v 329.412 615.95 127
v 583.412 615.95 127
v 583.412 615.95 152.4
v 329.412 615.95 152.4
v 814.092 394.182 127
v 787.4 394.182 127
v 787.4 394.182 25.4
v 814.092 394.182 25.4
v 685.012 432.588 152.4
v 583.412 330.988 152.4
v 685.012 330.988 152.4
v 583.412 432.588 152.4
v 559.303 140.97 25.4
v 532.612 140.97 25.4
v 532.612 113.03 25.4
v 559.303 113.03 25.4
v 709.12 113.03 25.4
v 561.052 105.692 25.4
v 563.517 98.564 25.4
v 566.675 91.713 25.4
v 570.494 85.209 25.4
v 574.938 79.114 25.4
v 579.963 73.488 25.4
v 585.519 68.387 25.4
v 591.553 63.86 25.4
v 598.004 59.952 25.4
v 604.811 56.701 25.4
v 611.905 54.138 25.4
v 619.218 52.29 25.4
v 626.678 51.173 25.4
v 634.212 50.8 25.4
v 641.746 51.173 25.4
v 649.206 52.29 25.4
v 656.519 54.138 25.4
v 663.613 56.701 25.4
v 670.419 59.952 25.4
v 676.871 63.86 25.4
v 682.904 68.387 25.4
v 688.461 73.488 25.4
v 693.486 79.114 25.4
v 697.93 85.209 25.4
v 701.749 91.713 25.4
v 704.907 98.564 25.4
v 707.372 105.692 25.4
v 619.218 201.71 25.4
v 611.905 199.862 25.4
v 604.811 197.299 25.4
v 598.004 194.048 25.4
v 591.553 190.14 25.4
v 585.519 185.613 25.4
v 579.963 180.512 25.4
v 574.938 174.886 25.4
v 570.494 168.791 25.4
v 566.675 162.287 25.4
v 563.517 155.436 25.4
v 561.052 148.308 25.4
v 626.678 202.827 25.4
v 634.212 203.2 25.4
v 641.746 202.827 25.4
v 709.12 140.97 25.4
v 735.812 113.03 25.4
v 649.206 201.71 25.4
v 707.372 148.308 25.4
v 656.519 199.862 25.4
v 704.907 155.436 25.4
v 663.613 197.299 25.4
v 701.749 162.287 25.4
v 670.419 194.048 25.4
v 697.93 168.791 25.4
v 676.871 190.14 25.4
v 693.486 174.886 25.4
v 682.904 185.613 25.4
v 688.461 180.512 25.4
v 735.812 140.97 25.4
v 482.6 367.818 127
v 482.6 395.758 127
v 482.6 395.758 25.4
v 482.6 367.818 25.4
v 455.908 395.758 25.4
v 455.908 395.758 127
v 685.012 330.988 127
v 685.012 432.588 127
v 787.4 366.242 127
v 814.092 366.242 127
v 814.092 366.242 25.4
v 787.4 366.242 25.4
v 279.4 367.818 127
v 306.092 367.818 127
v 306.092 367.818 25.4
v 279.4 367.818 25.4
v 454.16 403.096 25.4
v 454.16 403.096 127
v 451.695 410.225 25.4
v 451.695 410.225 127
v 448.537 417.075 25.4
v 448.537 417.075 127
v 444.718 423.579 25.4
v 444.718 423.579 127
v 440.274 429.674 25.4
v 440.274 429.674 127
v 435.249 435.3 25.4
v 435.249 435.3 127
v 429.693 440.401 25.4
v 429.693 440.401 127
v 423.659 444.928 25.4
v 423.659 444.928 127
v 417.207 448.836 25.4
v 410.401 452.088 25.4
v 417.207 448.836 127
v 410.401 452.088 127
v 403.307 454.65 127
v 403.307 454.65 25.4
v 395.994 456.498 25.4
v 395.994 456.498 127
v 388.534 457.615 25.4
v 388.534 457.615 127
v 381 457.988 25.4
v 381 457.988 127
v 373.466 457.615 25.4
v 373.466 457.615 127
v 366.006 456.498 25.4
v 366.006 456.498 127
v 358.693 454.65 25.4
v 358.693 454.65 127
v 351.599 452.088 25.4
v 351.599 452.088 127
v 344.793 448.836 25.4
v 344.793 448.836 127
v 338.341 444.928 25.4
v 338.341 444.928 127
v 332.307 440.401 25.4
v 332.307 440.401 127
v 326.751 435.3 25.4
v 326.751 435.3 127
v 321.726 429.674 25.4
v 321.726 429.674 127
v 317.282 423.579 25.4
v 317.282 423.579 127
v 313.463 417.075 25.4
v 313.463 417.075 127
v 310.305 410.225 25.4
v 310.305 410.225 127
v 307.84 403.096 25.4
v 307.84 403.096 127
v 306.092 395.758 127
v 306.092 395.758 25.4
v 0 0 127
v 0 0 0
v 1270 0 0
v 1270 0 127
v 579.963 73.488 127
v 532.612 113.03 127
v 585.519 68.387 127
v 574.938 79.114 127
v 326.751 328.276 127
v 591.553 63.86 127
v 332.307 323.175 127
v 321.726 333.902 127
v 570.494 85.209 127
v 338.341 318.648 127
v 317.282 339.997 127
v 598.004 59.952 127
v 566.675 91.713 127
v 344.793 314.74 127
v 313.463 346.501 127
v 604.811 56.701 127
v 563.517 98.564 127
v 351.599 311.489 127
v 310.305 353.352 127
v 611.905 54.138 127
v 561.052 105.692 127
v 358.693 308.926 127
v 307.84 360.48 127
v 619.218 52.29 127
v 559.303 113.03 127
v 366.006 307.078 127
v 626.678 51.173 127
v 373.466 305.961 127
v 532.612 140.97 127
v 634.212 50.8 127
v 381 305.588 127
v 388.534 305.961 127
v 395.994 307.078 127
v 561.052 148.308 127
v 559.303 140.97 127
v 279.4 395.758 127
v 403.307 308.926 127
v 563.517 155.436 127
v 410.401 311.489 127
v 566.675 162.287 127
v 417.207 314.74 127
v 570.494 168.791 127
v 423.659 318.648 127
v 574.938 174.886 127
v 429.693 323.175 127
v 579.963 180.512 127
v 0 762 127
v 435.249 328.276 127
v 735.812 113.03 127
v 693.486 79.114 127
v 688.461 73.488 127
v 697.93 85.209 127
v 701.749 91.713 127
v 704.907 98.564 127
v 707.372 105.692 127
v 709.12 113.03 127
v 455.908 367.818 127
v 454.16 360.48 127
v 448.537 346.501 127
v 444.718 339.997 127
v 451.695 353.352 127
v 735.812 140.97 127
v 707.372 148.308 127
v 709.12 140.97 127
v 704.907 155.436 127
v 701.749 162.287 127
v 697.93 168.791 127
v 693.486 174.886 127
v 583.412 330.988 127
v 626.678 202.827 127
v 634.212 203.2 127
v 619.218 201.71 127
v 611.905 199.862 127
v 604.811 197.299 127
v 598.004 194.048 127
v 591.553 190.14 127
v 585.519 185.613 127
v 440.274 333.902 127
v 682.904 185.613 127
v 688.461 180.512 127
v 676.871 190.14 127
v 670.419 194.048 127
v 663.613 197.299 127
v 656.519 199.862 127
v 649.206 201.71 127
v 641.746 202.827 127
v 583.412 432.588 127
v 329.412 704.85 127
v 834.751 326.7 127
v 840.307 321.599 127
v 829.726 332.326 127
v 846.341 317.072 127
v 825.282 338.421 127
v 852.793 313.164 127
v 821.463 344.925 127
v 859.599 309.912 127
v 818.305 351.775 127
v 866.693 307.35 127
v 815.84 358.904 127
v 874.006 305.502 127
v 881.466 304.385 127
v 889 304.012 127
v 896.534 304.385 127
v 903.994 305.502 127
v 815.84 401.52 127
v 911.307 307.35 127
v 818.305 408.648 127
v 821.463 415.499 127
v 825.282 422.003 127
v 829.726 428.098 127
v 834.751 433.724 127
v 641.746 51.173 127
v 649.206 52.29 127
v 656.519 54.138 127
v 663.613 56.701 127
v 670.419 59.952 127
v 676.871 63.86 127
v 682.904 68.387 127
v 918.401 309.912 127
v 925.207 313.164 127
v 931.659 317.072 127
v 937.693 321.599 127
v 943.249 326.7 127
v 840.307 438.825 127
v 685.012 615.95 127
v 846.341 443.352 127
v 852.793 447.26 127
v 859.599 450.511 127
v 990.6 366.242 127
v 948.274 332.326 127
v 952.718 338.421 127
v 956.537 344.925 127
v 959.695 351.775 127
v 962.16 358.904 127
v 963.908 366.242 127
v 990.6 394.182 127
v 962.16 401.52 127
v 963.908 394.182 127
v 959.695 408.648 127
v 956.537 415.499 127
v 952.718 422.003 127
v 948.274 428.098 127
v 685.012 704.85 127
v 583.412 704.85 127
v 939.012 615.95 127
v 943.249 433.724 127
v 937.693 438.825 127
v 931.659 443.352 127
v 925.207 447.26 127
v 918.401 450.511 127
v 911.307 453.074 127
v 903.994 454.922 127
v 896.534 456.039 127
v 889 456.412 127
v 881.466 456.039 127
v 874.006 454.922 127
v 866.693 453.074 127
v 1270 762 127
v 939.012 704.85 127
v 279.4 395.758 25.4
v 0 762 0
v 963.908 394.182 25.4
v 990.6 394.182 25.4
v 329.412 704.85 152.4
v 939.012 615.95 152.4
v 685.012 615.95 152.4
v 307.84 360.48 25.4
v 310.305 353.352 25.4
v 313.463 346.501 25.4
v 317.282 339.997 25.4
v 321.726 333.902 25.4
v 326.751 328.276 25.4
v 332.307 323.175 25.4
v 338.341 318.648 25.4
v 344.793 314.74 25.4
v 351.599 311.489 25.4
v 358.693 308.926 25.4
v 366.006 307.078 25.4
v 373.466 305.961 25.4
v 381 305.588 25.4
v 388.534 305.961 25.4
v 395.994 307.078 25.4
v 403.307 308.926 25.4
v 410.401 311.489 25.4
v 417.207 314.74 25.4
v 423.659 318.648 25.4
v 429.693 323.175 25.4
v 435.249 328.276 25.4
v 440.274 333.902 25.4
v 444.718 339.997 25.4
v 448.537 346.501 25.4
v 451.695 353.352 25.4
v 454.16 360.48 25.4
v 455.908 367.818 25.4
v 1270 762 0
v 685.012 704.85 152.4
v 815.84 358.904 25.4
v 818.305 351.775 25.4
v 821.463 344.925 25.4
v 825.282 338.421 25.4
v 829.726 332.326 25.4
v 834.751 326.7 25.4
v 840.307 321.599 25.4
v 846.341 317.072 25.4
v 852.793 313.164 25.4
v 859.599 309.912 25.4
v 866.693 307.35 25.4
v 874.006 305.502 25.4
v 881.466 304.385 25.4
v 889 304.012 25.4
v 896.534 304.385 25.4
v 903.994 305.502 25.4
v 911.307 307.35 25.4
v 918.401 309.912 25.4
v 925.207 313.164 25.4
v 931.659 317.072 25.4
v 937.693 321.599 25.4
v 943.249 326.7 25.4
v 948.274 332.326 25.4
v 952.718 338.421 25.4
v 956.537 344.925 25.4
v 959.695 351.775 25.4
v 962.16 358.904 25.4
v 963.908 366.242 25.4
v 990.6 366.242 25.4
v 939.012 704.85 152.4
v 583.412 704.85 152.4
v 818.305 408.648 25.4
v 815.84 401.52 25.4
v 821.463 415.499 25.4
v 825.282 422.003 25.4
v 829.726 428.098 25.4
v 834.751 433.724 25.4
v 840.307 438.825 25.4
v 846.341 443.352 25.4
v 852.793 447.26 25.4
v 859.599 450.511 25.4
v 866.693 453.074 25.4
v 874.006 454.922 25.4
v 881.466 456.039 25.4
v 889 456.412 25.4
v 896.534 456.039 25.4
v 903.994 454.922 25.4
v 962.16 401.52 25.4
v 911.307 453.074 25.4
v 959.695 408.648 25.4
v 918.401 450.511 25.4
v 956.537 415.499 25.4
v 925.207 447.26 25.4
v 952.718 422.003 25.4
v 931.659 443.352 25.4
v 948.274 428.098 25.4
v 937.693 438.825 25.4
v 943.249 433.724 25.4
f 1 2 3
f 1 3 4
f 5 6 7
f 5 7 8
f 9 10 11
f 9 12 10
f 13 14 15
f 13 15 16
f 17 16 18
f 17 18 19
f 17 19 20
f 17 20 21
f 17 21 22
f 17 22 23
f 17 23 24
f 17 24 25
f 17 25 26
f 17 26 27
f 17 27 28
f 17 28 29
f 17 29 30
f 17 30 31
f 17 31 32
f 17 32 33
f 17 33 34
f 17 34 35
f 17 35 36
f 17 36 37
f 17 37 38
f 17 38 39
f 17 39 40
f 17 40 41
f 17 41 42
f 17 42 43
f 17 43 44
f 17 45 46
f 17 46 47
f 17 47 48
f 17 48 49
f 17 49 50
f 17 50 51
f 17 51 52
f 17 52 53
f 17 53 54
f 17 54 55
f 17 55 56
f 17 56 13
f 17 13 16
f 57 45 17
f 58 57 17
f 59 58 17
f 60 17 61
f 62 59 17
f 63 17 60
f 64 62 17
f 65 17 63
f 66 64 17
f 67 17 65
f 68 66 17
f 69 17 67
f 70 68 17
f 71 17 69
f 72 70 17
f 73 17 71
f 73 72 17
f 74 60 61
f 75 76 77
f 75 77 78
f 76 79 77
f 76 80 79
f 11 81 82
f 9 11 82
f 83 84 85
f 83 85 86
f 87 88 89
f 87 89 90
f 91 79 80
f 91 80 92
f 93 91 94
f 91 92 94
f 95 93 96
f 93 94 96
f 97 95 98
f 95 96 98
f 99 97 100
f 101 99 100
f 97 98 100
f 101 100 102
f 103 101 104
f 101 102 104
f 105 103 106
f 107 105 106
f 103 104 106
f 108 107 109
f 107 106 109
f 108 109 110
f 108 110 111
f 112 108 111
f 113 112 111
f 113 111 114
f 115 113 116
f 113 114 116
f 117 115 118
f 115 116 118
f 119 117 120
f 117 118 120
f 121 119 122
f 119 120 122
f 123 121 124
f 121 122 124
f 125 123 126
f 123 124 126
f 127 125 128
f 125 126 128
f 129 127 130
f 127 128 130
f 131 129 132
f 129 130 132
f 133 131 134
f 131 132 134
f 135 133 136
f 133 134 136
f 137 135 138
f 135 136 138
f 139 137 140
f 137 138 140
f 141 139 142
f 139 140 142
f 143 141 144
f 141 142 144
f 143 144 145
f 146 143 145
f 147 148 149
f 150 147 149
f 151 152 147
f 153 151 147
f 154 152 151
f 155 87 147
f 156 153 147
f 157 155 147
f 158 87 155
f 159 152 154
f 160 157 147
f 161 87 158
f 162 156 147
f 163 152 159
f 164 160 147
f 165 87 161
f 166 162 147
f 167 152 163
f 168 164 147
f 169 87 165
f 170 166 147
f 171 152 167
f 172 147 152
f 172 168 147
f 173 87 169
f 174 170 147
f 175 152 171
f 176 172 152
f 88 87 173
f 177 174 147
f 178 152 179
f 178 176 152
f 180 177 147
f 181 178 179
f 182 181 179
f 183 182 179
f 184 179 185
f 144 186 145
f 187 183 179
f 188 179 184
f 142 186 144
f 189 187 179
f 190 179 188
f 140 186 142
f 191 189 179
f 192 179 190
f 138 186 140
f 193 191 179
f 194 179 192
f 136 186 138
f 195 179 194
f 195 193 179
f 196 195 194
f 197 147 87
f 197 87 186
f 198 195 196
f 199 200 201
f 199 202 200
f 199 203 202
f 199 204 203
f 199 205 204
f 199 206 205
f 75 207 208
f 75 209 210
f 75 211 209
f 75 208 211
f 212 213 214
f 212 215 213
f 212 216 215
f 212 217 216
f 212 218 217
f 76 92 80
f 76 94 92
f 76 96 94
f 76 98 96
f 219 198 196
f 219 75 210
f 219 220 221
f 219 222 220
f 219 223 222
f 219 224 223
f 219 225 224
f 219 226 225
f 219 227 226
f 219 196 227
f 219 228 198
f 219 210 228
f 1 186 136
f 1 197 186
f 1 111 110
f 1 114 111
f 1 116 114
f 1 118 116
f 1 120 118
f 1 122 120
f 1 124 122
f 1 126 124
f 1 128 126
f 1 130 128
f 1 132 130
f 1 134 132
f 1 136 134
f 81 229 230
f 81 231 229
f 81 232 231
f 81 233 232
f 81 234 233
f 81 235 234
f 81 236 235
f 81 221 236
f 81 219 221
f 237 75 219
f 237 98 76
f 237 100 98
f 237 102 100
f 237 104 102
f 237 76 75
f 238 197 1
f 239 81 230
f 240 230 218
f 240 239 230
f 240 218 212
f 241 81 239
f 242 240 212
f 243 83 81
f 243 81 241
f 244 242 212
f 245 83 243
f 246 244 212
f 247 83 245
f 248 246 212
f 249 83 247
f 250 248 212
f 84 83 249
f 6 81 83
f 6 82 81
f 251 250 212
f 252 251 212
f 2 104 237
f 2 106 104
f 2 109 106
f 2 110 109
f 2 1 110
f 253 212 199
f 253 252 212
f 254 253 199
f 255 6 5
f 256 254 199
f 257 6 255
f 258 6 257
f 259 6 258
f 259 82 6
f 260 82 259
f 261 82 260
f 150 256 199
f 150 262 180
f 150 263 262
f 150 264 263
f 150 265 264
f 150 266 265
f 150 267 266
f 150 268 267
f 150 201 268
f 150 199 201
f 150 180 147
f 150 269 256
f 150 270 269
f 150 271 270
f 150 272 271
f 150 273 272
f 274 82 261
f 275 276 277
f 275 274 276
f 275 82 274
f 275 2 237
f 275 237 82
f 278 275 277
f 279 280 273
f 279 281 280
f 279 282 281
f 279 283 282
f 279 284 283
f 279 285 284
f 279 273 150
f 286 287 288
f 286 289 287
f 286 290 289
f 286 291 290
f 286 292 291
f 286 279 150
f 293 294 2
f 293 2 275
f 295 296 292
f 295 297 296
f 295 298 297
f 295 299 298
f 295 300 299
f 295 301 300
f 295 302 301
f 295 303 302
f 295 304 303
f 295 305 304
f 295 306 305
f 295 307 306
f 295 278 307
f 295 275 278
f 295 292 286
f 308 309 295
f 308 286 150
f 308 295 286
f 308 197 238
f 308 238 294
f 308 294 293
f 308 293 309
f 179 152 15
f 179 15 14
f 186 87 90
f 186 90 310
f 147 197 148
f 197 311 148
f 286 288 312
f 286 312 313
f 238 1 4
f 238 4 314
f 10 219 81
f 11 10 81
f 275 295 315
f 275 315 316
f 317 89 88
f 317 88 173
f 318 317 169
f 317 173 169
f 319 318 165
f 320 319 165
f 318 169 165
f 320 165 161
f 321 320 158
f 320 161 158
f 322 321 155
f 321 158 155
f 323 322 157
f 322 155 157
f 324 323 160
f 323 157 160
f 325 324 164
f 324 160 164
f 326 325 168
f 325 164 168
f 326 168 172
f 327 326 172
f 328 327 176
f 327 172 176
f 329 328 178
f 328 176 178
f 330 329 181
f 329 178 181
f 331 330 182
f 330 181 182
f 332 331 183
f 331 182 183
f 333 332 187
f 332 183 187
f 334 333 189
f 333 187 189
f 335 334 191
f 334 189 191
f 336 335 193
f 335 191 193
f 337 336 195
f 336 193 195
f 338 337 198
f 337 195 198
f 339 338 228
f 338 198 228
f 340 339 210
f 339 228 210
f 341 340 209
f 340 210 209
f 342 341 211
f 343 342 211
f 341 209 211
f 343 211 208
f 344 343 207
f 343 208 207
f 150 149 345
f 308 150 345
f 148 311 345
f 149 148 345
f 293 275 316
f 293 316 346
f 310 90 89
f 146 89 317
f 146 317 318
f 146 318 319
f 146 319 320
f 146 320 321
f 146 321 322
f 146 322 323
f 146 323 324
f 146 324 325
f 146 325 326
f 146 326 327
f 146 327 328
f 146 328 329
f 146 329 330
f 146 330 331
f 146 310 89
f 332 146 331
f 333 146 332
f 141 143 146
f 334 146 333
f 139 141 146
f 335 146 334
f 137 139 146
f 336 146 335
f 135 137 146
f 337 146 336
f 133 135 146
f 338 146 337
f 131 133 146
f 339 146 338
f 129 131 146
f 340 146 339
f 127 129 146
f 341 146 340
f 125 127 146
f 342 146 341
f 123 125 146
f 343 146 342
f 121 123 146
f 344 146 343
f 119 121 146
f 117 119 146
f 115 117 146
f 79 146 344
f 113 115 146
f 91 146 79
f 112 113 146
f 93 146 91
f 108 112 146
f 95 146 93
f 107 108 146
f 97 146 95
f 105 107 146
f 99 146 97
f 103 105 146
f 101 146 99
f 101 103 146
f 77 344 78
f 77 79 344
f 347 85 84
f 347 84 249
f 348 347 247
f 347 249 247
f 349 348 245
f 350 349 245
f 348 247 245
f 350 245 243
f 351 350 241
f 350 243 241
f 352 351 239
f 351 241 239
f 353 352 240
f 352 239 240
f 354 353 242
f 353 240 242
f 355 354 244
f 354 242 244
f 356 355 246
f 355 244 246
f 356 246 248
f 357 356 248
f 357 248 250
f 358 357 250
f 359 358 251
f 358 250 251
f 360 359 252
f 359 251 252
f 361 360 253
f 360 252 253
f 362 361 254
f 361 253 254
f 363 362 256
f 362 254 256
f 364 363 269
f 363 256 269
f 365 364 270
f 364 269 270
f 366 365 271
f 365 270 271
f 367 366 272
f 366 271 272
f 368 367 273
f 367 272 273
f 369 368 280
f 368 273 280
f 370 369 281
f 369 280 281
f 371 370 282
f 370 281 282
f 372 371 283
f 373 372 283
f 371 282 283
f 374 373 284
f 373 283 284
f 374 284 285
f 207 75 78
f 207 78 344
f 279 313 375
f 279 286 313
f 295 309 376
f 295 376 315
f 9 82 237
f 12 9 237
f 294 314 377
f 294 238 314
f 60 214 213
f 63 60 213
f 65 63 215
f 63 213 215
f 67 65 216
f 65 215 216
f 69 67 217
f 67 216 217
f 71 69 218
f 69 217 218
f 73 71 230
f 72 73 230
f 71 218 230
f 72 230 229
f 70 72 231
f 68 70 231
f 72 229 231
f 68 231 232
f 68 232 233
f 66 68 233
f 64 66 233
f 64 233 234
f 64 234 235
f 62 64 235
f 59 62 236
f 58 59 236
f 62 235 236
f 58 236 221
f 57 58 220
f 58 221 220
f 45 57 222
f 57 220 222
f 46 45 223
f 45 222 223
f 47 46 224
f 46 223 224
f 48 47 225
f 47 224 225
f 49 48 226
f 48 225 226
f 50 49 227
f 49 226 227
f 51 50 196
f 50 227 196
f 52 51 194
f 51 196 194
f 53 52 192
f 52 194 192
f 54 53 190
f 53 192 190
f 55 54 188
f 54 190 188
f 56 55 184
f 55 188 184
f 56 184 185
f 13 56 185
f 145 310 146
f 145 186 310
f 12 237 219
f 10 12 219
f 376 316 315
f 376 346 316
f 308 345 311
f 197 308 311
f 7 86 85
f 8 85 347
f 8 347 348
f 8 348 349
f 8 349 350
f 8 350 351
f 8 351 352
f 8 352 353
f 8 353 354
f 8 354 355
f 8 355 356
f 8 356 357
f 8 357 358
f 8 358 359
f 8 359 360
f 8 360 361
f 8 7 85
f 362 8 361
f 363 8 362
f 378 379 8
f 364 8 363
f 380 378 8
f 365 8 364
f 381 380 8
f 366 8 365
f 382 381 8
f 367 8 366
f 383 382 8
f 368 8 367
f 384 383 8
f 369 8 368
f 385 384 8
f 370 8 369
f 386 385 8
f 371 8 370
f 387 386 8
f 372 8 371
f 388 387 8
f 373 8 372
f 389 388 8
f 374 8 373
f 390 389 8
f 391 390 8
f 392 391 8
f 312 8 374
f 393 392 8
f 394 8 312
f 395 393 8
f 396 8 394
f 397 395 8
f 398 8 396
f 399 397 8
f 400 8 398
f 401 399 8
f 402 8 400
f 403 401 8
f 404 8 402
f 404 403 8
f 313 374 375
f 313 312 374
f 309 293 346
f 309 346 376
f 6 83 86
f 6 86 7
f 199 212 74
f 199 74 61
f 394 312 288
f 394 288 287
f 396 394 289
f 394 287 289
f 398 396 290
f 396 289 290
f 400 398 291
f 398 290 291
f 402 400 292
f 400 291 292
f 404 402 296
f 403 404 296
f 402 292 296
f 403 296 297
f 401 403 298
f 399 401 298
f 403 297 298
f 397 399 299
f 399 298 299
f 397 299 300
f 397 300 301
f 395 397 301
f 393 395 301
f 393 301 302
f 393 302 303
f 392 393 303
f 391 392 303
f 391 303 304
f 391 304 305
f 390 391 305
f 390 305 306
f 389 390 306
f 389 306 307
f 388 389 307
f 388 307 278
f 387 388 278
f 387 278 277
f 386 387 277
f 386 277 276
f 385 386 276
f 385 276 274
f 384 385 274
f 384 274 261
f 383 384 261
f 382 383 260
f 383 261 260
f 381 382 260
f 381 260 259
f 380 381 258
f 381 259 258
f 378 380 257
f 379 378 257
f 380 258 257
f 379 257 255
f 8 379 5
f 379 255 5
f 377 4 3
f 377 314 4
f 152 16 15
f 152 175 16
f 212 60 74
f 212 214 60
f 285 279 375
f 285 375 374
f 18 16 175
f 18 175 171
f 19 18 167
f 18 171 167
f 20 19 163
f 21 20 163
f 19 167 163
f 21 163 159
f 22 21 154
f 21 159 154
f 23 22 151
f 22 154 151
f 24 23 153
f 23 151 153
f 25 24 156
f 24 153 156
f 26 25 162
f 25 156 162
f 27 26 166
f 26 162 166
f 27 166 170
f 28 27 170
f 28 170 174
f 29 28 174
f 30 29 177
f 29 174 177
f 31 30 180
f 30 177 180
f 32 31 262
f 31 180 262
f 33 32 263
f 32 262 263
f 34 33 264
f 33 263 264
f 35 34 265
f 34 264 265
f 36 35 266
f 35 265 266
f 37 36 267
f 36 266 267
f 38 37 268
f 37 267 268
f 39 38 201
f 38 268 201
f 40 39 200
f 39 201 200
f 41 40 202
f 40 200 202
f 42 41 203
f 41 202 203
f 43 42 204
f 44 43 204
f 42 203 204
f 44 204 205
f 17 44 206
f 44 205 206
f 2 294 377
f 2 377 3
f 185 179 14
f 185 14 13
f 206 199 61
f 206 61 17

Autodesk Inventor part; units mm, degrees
ref_plane "YZ Plane" through (0, 0, 0) normal (1, 0, 0) x (0, 1, 0)
ref_plane "XZ Plane" through (0, 0, 0) normal (0, 1, 0) x (-1, 0, 0)
ref_plane "XY Plane" through (0, 0, 0) normal (0, 0, 1) x (1, 0, 0)
sketch "Sketch1" plane through (0, 0, 0) normal (0, 0, 1) x (1, 0, 0)
  line L0 (0, 0) -> (1270, 0)
  line L1 (1270, 0) -> (1270, 762)
  line L2 (1270, 762) -> (0, 762)
  line L3 (0, 762) -> (0, 0)
  dimension "d0" = 762
  dimension "d1" = 1270
extrude "Extrusion1" add sketch "Sketch1" along normal blind 127
sketch "Sketch2" plane through (0, 0, 127) normal (0, 0, 1) x (1, 0, 0)
  circle A0 centre (381, 381.7881) radius 76.2
  circle A1 centre (634.2119, 127) radius 76.2
  circle A2 centre (889, 380.2119) radius 76.2
  line L0 (0, 0) -> (1270, 0) projected
  line L1 (787.4, 394.1819) -> (990.6, 394.1819)
  line L2 (990.6, 394.1819) -> (990.6, 366.2419)
  line L3 (990.6, 366.2419) -> (787.4, 366.2419)
  line L4 (787.4, 366.2419) -> (787.4, 394.1819)
  line L5 (787.4, 394.1819) -> (990.6, 366.2419) construction
  line L6 (990.6, 394.1819) -> (787.4, 366.2419) construction
  line L7 (279.4, 395.7581) -> (482.6, 395.7581)
  line L8 (482.6, 395.7581) -> (482.6, 367.8181)
  line L9 (482.6, 367.8181) -> (279.4, 367.8181)
  line L10 (279.4, 367.8181) -> (279.4, 395.7581)
  line L11 (279.4, 395.7581) -> (482.6, 367.8181) construction
  line L12 (482.6, 395.7581) -> (279.4, 367.8181) construction
  line L13 (532.6119, 140.97) -> (735.8119, 140.97)
  line L14 (735.8119, 140.97) -> (735.8119, 113.03)
  line L15 (735.8119, 113.03) -> (532.6119, 113.03)
  line L16 (532.6119, 113.03) -> (532.6119, 140.97)
  line L17 (532.6119, 140.97) -> (735.8119, 113.03) construction
  line L18 (735.8119, 140.97) -> (532.6119, 113.03) construction
  point P0 (635, 381)
  point P1 (635, 0)
  point P2 (635, 0)
  point P3 (889, 380.2119)
  point P4 (381, 381.7881)
  point P5 (634.2119, 127)
  point P6 (306.0915, 367.8181)
  point P7 (306.0915, 395.7581)
  point P8 (455.9085, 395.7581)
  point P9 (455.9085, 367.8181)
  point P10 (709.1204, 140.97)
  point P11 (709.1204, 113.03)
  point P12 (559.3034, 113.03)
  point P13 (559.3034, 140.97)
  point P14 (963.9085, 394.1819)
  point P15 (963.9085, 366.2419)
  point P16 (814.0915, 366.2419)
  point P17 (814.0915, 394.1819)
  dimension "d14" = 152.4
  dimension "d17" = 180
  dimension "d19" = 127
  dimension "d20" = 381
  dimension "d23" = 203.2
  dimension "d24" = 27.94
  dimension "d25" = 203.2
  dimension "d26" = 27.94
  dimension "d27" = 203.2
  dimension "d28" = 27.94
extrude "Extrusion2" cut sketch "Sketch2" against normal blind 101.6
sketch "Sketch4" plane through (0, 0, 127) normal (0, 0, 1) x (1, 0, 0)
  line L0 (685.0119, 704.85) -> (939.0119, 704.85)
  line L1 (939.0119, 704.85) -> (939.0119, 615.95)
  line L2 (939.0119, 615.95) -> (685.0119, 615.95)
  line L3 (685.0119, 615.95) -> (685.0119, 704.85)
  line L4 (685.0119, 704.85) -> (939.0119, 615.95) construction
  line L5 (939.0119, 704.85) -> (685.0119, 615.95) construction
  line L6 (787.4, 394.1819) -> (814.0915, 394.1819) projected
  arc A0 (963.9085, 394.1819) -> (814.0915, 394.1819) centre (889, 380.2119) ccw projected
  line L7 (963.9085, 394.1819) -> (990.6, 394.1819) projected
  line L8 (990.6, 394.1819) -> (990.6, 366.2419) projected
  line L9 (990.6, 366.2419) -> (963.9085, 366.2419) projected
  arc A1 (814.0915, 366.2419) -> (963.9085, 366.2419) centre (889, 380.2119) ccw projected
  line L10 (814.0915, 366.2419) -> (787.4, 366.2419) projected
  line L11 (787.4, 366.2419) -> (787.4, 394.1819) projected
  line L12 (532.6119, 140.97) -> (559.3034, 140.97) projected
  arc A2 (709.1204, 140.97) -> (559.3034, 140.97) centre (634.2119, 127) ccw projected
  line L13 (709.1204, 140.97) -> (735.8119, 140.97) projected
  line L14 (735.8119, 140.97) -> (735.8119, 113.03) projected
  line L15 (735.8119, 113.03) -> (709.1204, 113.03) projected
  arc A3 (559.3034, 113.03) -> (709.1204, 113.03) centre (634.2119, 127) ccw projected
  line L16 (559.3034, 113.03) -> (532.6119, 113.03) projected
  line L17 (532.6119, 113.03) -> (532.6119, 140.97) projected
  line L18 (482.6, 367.8181) -> (455.9085, 367.8181) projected
  arc A4 (306.0915, 367.8181) -> (455.9085, 367.8181) centre (381, 381.7881) ccw projected
  line L19 (306.0915, 367.8181) -> (279.4, 367.8181) projected
  line L20 (279.4, 367.8181) -> (279.4, 395.7581) projected
  line L21 (279.4, 395.7581) -> (306.0915, 395.7581) projected
  arc A5 (455.9085, 395.7581) -> (306.0915, 395.7581) centre (381, 381.7881) ccw projected
  line L22 (455.9085, 395.7581) -> (482.6, 395.7581) projected
  line L23 (482.6, 395.7581) -> (482.6, 367.8181) projected
  line L24 (1270, 0) -> (1270, 762) projected
  line L25 (1270, 762) -> (0, 762) projected
  line L26 (0, 762) -> (0, 0) projected
  line L27 (0, 0) -> (1270, 0) projected
  line L28 (532.6119, 140.97) -> (532.6119, 113.03) projected
  line L29 (532.6119, 113.03) -> (559.3034, 113.03) projected
  arc A6 (559.3034, 113.03) -> (709.1204, 113.03) centre (634.2119, 127) ccw projected
  line L30 (709.1204, 113.03) -> (735.8119, 113.03) projected
  line L31 (735.8119, 113.03) -> (735.8119, 140.97) projected
  line L32 (735.8119, 140.97) -> (709.1204, 140.97) projected
  arc A7 (709.1204, 140.97) -> (559.3034, 140.97) centre (634.2119, 127) ccw projected
  line L33 (559.3034, 140.97) -> (532.6119, 140.97) projected
  line L34 (329.4119, 704.85) -> (583.4119, 704.85)
  line L35 (583.4119, 704.85) -> (583.4119, 615.95)
  line L36 (583.4119, 615.95) -> (329.4119, 615.95)
  line L37 (329.4119, 615.95) -> (329.4119, 704.85)
  line L38 (329.4119, 704.85) -> (583.4119, 615.95) construction
  line L39 (583.4119, 704.85) -> (329.4119, 615.95) construction
  line L40 (583.4119, 330.9881) -> (685.0119, 330.9881)
  line L41 (685.0119, 330.9881) -> (685.0119, 432.5881)
  line L42 (685.0119, 432.5881) -> (583.4119, 432.5881)
  line L43 (583.4119, 432.5881) -> (583.4119, 330.9881)
  line L44 (583.4119, 330.9881) -> (685.0119, 432.5881) construction
  line L45 (685.0119, 330.9881) -> (583.4119, 432.5881) construction
  point P0 (812.0119, 660.4)
  point P1 (634.2119, 653.1699)
  point P2 (456.4119, 660.4)
  point P3 (634.2119, 381.7881)
  dimension "d29" = 254
  dimension "d30" = 88.9
  dimension "d31" = 177.8
  dimension "d32" = 101.6
  dimension "d33" = 254
  dimension "d34" = 88.9
  dimension "d35" = 177.8
  dimension "d36" = 101.6
  dimension "d37" = 101.6
  dimension "d38" = 101.6
extrude "Extrusion3" add sketch "Sketch4" along normal blind 25.4 contours L0 L1 L2 L3 | L34 L35 L36 L37 | L43 L42 L41 L40
properties part number "Deska" material "Wood (Oak)"
